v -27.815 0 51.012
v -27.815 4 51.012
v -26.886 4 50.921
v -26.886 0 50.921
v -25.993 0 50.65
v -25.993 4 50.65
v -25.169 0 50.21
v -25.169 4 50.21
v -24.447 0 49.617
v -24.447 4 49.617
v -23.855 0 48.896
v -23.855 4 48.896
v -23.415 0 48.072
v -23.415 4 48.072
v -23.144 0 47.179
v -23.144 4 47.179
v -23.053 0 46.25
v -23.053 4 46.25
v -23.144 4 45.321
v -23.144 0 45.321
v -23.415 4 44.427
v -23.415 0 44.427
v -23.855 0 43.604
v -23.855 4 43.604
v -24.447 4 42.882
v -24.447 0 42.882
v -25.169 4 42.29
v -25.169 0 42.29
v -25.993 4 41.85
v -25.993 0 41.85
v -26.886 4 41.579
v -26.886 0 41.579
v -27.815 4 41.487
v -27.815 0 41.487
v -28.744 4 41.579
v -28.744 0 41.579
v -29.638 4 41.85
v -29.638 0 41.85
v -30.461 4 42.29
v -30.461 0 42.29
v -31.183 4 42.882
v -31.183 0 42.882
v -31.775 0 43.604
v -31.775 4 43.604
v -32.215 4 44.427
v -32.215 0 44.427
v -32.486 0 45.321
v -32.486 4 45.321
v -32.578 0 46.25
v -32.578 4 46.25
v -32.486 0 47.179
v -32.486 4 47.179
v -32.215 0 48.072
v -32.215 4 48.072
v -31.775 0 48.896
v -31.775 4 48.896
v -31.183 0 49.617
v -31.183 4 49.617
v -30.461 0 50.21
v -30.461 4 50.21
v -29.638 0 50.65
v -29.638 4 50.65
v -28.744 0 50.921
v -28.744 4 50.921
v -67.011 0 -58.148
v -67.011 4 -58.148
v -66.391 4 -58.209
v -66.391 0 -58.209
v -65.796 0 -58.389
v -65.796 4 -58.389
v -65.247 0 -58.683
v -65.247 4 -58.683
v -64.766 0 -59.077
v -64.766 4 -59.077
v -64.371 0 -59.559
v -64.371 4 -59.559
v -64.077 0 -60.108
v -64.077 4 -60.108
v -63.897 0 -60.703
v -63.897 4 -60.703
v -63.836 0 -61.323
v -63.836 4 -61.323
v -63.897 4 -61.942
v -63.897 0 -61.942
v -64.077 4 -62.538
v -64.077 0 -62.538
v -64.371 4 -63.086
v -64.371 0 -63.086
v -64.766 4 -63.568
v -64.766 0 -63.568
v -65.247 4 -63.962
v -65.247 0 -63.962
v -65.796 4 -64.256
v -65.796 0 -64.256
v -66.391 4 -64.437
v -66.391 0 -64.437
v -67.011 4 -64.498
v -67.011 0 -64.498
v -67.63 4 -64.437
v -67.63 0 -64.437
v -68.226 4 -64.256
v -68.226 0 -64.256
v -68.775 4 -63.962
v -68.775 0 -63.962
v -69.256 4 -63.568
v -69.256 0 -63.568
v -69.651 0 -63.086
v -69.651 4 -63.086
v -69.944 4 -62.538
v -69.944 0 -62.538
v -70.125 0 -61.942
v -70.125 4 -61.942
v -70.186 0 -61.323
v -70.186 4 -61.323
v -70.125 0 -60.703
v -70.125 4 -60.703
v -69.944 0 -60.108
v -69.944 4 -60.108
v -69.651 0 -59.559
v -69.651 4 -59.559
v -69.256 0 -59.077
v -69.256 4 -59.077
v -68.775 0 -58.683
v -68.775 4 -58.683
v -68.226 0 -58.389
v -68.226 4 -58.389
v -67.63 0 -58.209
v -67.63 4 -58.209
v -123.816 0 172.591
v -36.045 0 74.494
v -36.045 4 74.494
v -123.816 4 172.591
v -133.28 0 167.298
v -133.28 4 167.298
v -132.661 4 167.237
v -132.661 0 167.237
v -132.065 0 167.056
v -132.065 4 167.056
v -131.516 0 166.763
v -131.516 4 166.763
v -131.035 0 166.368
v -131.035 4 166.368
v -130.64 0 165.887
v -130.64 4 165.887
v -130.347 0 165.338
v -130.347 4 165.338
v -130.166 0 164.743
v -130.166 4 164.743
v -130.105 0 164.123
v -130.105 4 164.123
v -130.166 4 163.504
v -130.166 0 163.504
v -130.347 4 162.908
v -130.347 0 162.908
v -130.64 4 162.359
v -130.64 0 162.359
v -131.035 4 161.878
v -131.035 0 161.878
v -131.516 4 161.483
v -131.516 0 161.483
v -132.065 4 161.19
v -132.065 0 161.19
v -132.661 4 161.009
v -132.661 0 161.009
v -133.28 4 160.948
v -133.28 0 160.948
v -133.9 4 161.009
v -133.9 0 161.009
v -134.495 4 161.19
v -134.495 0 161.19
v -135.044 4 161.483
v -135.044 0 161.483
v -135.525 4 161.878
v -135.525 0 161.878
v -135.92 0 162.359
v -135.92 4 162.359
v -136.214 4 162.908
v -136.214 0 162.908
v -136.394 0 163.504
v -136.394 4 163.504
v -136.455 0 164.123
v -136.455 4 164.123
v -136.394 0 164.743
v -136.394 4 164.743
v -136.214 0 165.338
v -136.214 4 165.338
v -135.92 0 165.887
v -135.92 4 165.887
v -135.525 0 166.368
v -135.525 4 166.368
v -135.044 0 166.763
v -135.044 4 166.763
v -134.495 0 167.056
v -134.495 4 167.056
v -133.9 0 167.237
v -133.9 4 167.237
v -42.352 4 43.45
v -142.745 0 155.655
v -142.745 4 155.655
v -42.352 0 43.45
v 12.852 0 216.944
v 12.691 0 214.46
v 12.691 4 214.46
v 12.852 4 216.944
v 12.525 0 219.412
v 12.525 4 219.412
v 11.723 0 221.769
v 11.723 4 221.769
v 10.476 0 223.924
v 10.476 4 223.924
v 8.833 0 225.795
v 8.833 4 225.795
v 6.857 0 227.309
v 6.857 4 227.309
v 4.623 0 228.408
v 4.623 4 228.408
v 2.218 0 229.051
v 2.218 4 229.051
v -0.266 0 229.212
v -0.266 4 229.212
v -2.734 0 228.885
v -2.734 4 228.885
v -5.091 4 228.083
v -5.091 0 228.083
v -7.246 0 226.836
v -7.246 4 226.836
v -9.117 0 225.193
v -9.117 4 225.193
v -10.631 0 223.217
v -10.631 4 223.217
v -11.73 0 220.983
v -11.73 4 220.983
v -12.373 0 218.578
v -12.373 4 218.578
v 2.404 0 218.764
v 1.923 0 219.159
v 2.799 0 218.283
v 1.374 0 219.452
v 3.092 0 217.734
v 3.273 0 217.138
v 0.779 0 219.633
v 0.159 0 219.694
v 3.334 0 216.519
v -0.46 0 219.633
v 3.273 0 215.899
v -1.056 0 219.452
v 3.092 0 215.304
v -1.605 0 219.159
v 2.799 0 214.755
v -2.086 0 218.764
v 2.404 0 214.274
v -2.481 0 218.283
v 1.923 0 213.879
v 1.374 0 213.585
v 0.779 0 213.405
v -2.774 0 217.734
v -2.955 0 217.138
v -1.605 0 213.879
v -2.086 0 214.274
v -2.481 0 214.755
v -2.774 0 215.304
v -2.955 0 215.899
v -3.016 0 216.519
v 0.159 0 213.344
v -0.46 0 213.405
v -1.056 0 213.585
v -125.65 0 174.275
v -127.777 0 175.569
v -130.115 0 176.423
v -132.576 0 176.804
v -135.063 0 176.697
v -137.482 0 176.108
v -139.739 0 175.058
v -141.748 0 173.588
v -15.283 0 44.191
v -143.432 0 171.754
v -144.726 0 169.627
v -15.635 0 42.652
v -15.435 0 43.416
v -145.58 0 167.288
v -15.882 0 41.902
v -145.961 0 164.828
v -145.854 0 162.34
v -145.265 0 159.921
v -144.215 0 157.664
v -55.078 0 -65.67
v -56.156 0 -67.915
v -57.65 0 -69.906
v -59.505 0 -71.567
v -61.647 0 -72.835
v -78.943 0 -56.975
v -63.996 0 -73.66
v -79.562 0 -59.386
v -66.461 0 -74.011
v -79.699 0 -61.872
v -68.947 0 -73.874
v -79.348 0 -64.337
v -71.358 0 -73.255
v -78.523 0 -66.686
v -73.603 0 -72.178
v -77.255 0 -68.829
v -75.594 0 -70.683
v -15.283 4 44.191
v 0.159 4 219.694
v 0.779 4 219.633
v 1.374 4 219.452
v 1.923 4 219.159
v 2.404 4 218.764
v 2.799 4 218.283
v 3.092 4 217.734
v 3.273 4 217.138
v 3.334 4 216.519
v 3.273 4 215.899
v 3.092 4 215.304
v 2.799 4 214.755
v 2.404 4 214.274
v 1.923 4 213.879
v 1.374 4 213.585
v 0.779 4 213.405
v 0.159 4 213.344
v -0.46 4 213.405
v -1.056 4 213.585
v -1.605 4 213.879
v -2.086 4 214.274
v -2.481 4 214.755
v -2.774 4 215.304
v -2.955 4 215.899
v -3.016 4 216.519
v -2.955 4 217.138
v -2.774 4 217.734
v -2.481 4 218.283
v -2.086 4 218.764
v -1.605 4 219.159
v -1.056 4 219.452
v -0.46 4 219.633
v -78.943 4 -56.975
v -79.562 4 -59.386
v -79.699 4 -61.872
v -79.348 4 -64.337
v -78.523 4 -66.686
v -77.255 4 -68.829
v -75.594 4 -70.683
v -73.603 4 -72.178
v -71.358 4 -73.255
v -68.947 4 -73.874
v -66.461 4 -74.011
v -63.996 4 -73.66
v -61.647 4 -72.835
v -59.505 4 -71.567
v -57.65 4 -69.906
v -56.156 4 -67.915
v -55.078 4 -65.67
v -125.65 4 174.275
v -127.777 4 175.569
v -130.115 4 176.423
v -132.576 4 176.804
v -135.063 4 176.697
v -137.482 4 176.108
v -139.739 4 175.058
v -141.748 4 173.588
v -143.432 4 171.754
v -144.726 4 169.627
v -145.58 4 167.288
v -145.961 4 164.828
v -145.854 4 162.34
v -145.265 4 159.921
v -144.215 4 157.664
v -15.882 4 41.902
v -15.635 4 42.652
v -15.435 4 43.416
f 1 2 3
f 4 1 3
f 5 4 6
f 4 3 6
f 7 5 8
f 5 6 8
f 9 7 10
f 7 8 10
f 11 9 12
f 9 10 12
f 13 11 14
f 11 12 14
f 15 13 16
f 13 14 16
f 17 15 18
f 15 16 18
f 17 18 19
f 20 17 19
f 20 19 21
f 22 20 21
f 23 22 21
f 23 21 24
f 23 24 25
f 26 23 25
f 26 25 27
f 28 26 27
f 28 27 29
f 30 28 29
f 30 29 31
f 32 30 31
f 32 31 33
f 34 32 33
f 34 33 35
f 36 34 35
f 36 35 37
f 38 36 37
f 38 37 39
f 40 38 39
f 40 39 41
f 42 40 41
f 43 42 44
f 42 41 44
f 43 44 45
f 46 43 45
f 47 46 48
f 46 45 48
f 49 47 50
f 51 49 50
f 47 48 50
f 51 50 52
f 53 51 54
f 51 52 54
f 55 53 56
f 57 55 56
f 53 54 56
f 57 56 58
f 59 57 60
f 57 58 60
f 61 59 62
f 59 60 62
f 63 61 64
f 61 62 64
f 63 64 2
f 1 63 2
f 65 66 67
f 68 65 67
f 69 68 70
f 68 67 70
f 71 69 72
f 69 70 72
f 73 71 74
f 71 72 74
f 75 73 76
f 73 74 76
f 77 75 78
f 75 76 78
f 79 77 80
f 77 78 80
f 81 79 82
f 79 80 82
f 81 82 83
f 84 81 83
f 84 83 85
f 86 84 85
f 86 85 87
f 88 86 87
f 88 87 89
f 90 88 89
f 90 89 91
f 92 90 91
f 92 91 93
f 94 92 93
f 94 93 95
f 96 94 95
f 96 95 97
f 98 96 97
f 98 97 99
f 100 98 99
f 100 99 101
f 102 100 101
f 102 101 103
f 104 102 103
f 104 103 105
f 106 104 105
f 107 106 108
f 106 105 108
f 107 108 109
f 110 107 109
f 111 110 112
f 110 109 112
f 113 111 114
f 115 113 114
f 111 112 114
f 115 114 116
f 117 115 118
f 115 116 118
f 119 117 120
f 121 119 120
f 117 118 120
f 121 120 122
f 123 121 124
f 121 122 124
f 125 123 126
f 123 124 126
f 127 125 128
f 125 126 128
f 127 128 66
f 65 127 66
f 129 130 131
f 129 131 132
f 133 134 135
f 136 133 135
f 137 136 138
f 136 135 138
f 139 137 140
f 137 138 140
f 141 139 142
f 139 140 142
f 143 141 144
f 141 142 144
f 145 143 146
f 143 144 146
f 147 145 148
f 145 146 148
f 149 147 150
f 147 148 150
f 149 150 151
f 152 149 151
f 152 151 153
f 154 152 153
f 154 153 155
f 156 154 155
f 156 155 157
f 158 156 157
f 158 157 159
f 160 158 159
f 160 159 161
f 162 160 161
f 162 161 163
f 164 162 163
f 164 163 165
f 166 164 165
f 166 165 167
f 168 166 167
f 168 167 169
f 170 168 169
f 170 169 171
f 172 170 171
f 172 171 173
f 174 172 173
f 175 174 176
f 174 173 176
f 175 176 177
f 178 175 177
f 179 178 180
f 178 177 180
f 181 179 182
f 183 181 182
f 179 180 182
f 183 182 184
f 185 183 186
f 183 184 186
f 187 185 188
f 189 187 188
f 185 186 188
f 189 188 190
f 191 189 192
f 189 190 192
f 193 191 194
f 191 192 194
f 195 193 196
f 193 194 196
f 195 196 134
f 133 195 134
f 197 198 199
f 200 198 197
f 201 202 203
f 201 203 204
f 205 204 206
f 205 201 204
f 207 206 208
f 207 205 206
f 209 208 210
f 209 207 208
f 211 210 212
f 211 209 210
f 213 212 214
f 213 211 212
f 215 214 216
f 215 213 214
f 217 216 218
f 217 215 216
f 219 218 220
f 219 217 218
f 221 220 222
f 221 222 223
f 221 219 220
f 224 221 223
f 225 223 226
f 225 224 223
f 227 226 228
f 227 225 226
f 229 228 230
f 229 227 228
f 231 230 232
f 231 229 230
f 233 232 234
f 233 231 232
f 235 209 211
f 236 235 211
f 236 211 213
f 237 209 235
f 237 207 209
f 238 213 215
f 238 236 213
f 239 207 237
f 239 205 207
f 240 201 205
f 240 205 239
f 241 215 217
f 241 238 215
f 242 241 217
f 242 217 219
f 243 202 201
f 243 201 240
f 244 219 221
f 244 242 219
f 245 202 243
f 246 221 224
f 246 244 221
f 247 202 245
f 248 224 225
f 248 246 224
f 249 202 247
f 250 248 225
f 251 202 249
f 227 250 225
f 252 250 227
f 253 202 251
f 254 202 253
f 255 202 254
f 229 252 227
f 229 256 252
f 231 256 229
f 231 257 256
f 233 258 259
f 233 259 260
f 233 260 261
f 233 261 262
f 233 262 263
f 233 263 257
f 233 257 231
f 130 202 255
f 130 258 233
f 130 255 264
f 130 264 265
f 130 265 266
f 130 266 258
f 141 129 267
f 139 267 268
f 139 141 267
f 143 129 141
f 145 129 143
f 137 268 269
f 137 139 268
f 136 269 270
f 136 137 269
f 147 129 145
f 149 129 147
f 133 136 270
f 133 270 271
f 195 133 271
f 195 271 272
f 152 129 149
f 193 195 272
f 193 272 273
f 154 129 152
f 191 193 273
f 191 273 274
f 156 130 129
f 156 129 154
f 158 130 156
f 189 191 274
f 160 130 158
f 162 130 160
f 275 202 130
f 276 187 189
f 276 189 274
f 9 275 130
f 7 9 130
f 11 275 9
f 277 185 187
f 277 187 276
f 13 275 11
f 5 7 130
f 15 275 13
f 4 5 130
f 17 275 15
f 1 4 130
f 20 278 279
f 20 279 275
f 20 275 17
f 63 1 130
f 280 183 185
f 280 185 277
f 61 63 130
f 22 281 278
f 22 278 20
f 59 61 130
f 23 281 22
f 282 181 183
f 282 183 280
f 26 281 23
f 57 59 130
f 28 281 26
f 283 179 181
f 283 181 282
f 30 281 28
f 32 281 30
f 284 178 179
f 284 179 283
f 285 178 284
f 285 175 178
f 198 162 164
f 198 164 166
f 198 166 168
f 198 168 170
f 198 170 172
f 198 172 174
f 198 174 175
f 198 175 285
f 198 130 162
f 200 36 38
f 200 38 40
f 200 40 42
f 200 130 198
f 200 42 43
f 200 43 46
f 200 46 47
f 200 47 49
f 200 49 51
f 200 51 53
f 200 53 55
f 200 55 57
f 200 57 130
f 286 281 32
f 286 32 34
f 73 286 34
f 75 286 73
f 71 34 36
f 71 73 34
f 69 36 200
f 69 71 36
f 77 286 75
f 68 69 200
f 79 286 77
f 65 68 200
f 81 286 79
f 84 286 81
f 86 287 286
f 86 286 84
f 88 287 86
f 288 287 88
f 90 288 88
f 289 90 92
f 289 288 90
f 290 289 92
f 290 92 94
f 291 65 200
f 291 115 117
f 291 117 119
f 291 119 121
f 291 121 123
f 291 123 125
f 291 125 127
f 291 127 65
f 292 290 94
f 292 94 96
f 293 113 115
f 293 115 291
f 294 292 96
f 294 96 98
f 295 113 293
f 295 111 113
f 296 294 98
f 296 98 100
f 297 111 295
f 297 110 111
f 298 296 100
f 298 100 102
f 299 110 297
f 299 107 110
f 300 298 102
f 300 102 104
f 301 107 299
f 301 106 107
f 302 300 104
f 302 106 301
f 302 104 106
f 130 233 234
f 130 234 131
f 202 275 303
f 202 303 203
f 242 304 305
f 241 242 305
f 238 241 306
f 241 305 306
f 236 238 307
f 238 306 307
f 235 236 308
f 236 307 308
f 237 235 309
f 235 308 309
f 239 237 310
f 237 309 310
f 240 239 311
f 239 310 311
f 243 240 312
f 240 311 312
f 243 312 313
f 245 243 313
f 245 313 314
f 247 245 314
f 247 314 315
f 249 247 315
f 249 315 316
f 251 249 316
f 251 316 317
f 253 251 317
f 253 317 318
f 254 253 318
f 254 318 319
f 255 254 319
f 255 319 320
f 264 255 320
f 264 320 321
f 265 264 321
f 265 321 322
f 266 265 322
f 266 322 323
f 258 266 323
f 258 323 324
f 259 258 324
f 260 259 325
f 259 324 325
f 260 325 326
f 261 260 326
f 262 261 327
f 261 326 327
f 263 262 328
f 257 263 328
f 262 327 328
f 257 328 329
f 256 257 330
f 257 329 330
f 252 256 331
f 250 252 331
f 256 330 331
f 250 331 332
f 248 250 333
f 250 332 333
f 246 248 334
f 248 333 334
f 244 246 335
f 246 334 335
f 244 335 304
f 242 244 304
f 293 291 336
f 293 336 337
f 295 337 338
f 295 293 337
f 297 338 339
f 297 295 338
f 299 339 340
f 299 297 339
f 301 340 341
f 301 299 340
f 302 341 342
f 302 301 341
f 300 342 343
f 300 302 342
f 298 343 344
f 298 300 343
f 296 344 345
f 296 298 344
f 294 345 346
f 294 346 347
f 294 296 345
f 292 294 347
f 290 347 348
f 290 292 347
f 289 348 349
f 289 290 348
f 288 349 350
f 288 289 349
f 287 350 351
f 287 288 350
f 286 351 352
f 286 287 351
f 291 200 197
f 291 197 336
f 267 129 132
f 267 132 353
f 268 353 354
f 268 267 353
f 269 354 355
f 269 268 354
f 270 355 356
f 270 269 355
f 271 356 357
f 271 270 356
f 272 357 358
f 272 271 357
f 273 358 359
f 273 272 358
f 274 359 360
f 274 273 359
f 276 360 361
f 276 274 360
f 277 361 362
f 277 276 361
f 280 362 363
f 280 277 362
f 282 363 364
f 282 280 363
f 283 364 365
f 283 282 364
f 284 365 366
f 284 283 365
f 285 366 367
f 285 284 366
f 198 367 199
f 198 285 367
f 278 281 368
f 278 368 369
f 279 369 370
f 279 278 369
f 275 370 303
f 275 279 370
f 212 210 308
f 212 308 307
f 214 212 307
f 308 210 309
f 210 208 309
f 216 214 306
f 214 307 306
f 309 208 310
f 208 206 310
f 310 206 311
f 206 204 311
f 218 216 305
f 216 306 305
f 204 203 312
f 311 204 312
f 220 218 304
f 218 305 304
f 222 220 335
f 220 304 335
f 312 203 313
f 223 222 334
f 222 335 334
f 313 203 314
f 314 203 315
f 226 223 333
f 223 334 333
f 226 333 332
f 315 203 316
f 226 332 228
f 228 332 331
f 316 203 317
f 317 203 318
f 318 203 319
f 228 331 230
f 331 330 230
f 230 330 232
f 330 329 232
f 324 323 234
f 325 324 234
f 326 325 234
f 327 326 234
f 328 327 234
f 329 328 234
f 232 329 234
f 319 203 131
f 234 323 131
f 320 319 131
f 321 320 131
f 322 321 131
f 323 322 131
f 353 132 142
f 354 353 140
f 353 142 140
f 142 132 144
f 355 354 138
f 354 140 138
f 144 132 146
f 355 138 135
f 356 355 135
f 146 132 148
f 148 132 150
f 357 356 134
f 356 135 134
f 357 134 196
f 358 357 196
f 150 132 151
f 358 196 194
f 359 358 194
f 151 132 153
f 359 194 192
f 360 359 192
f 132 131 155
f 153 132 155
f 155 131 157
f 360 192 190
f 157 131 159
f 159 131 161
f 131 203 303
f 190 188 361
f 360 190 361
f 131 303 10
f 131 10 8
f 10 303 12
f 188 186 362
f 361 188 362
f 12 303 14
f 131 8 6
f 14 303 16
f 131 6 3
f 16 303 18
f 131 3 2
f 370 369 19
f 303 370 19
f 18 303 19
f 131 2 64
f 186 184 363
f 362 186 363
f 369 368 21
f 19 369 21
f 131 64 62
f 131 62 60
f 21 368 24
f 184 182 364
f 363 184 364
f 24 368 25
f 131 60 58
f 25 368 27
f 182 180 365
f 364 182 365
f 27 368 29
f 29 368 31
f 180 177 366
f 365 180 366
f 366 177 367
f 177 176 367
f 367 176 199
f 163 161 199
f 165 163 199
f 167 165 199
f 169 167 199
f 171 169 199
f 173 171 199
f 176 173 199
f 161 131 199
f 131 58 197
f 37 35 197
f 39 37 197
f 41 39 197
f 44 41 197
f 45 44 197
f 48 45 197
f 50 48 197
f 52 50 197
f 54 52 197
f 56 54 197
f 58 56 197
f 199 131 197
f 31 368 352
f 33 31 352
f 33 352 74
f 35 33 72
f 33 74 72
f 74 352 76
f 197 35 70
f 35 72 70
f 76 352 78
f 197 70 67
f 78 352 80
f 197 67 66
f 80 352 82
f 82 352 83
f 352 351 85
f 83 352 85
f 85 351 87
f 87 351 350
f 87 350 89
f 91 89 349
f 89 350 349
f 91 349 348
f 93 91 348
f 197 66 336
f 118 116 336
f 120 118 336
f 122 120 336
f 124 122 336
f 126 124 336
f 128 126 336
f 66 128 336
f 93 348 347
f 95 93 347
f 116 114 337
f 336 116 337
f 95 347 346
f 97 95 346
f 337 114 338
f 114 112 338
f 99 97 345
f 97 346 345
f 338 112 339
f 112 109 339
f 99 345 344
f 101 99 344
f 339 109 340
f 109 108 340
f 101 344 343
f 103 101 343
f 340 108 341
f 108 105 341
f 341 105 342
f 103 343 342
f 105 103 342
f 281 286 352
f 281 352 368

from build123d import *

# Parameters (mm, degrees)
BOSS_EXTRUDE1_DEPTH = 4
SKETCH5_R           = 4.7625
CUT_EXTRUDE1_DEPTH  = 272.785715814
SKETCH8_R           = 3.175
CUT_EXTRUDE3_DEPTH  = 272.785715814


with BuildPart() as part:
    # Sketch1 → Boss-Extrude1 (new body)
    with BuildSketch(Plane(origin=(0, 0, 0), x_dir=(1, 0, 0), z_dir=(0, 1, 0))):
        with BuildLine():
            Line((-55.078065391, 65.670374736), (-15.882456002, -41.901827969))
            ThreePointArc((-15.882456002, -41.901827969), (-15.529329867, -43.032283758), (-15.283044075, -44.190718765))
            Line((-15.283044075, -44.190718765), (12.6911511, -214.459876374))
            ThreePointArc((12.6911511, -214.459876374), (2.218090383, -229.050798182), (-12.372831425, -218.577737465))
            Line((-12.372831425, -218.577737465), (-36.044890736, -74.494178583))
            Line((-36.044890736, -74.494178583), (-123.815593368, -172.591431542))
            ThreePointArc((-123.815593368, -172.591431542), (-141.748449811, -173.587754678), (-142.744772948, -155.654898235))
            Line((-142.744772948, -155.654898235), (-42.351793784, -43.450310863))
            Line((-42.351793784, -43.450310863), (-78.943224061, 56.974732054))
            ThreePointArc((-78.943224061, 56.974732054), (-71.358466067, 73.25513273), (-55.078065391, 65.670374736))
        make_face()
    extrude(amount=BOSS_EXTRUDE1_DEPTH)

    # Sketch5 → Cut-Extrude1 (cut, through all)
    with BuildSketch(Plane(origin=(0, 4, 0), x_dir=(1, 0, 0), z_dir=(0, 1, 0))):
        with Locations(Location((-27.815035337, -46.24964931, 0), (0, 0, 270))):
            Circle(SKETCH5_R)
    extrude(amount=-CUT_EXTRUDE1_DEPTH, mode=Mode.SUBTRACT)

    # Sketch8 → Cut-Extrude3 (cut, through all)
    with BuildSketch(Plane(origin=(0, 4, 0), x_dir=(1, 0, 0), z_dir=(0, 1, 0))):
        with Locations(Location((-67.010644726, 61.322553395, 0), (0, 0, 270))):
            Circle(SKETCH8_R)
        with Locations(Location((0.159159837, -216.518806919, 0), (0, 0, 270))):
            Circle(SKETCH8_R)
        with Locations(Location((-133.280183158, -164.123164888, 0), (0, 0, 270))):
            Circle(SKETCH8_R)
    extrude(amount=-CUT_EXTRUDE3_DEPTH, mode=Mode.SUBTRACT)


solid = part.part
